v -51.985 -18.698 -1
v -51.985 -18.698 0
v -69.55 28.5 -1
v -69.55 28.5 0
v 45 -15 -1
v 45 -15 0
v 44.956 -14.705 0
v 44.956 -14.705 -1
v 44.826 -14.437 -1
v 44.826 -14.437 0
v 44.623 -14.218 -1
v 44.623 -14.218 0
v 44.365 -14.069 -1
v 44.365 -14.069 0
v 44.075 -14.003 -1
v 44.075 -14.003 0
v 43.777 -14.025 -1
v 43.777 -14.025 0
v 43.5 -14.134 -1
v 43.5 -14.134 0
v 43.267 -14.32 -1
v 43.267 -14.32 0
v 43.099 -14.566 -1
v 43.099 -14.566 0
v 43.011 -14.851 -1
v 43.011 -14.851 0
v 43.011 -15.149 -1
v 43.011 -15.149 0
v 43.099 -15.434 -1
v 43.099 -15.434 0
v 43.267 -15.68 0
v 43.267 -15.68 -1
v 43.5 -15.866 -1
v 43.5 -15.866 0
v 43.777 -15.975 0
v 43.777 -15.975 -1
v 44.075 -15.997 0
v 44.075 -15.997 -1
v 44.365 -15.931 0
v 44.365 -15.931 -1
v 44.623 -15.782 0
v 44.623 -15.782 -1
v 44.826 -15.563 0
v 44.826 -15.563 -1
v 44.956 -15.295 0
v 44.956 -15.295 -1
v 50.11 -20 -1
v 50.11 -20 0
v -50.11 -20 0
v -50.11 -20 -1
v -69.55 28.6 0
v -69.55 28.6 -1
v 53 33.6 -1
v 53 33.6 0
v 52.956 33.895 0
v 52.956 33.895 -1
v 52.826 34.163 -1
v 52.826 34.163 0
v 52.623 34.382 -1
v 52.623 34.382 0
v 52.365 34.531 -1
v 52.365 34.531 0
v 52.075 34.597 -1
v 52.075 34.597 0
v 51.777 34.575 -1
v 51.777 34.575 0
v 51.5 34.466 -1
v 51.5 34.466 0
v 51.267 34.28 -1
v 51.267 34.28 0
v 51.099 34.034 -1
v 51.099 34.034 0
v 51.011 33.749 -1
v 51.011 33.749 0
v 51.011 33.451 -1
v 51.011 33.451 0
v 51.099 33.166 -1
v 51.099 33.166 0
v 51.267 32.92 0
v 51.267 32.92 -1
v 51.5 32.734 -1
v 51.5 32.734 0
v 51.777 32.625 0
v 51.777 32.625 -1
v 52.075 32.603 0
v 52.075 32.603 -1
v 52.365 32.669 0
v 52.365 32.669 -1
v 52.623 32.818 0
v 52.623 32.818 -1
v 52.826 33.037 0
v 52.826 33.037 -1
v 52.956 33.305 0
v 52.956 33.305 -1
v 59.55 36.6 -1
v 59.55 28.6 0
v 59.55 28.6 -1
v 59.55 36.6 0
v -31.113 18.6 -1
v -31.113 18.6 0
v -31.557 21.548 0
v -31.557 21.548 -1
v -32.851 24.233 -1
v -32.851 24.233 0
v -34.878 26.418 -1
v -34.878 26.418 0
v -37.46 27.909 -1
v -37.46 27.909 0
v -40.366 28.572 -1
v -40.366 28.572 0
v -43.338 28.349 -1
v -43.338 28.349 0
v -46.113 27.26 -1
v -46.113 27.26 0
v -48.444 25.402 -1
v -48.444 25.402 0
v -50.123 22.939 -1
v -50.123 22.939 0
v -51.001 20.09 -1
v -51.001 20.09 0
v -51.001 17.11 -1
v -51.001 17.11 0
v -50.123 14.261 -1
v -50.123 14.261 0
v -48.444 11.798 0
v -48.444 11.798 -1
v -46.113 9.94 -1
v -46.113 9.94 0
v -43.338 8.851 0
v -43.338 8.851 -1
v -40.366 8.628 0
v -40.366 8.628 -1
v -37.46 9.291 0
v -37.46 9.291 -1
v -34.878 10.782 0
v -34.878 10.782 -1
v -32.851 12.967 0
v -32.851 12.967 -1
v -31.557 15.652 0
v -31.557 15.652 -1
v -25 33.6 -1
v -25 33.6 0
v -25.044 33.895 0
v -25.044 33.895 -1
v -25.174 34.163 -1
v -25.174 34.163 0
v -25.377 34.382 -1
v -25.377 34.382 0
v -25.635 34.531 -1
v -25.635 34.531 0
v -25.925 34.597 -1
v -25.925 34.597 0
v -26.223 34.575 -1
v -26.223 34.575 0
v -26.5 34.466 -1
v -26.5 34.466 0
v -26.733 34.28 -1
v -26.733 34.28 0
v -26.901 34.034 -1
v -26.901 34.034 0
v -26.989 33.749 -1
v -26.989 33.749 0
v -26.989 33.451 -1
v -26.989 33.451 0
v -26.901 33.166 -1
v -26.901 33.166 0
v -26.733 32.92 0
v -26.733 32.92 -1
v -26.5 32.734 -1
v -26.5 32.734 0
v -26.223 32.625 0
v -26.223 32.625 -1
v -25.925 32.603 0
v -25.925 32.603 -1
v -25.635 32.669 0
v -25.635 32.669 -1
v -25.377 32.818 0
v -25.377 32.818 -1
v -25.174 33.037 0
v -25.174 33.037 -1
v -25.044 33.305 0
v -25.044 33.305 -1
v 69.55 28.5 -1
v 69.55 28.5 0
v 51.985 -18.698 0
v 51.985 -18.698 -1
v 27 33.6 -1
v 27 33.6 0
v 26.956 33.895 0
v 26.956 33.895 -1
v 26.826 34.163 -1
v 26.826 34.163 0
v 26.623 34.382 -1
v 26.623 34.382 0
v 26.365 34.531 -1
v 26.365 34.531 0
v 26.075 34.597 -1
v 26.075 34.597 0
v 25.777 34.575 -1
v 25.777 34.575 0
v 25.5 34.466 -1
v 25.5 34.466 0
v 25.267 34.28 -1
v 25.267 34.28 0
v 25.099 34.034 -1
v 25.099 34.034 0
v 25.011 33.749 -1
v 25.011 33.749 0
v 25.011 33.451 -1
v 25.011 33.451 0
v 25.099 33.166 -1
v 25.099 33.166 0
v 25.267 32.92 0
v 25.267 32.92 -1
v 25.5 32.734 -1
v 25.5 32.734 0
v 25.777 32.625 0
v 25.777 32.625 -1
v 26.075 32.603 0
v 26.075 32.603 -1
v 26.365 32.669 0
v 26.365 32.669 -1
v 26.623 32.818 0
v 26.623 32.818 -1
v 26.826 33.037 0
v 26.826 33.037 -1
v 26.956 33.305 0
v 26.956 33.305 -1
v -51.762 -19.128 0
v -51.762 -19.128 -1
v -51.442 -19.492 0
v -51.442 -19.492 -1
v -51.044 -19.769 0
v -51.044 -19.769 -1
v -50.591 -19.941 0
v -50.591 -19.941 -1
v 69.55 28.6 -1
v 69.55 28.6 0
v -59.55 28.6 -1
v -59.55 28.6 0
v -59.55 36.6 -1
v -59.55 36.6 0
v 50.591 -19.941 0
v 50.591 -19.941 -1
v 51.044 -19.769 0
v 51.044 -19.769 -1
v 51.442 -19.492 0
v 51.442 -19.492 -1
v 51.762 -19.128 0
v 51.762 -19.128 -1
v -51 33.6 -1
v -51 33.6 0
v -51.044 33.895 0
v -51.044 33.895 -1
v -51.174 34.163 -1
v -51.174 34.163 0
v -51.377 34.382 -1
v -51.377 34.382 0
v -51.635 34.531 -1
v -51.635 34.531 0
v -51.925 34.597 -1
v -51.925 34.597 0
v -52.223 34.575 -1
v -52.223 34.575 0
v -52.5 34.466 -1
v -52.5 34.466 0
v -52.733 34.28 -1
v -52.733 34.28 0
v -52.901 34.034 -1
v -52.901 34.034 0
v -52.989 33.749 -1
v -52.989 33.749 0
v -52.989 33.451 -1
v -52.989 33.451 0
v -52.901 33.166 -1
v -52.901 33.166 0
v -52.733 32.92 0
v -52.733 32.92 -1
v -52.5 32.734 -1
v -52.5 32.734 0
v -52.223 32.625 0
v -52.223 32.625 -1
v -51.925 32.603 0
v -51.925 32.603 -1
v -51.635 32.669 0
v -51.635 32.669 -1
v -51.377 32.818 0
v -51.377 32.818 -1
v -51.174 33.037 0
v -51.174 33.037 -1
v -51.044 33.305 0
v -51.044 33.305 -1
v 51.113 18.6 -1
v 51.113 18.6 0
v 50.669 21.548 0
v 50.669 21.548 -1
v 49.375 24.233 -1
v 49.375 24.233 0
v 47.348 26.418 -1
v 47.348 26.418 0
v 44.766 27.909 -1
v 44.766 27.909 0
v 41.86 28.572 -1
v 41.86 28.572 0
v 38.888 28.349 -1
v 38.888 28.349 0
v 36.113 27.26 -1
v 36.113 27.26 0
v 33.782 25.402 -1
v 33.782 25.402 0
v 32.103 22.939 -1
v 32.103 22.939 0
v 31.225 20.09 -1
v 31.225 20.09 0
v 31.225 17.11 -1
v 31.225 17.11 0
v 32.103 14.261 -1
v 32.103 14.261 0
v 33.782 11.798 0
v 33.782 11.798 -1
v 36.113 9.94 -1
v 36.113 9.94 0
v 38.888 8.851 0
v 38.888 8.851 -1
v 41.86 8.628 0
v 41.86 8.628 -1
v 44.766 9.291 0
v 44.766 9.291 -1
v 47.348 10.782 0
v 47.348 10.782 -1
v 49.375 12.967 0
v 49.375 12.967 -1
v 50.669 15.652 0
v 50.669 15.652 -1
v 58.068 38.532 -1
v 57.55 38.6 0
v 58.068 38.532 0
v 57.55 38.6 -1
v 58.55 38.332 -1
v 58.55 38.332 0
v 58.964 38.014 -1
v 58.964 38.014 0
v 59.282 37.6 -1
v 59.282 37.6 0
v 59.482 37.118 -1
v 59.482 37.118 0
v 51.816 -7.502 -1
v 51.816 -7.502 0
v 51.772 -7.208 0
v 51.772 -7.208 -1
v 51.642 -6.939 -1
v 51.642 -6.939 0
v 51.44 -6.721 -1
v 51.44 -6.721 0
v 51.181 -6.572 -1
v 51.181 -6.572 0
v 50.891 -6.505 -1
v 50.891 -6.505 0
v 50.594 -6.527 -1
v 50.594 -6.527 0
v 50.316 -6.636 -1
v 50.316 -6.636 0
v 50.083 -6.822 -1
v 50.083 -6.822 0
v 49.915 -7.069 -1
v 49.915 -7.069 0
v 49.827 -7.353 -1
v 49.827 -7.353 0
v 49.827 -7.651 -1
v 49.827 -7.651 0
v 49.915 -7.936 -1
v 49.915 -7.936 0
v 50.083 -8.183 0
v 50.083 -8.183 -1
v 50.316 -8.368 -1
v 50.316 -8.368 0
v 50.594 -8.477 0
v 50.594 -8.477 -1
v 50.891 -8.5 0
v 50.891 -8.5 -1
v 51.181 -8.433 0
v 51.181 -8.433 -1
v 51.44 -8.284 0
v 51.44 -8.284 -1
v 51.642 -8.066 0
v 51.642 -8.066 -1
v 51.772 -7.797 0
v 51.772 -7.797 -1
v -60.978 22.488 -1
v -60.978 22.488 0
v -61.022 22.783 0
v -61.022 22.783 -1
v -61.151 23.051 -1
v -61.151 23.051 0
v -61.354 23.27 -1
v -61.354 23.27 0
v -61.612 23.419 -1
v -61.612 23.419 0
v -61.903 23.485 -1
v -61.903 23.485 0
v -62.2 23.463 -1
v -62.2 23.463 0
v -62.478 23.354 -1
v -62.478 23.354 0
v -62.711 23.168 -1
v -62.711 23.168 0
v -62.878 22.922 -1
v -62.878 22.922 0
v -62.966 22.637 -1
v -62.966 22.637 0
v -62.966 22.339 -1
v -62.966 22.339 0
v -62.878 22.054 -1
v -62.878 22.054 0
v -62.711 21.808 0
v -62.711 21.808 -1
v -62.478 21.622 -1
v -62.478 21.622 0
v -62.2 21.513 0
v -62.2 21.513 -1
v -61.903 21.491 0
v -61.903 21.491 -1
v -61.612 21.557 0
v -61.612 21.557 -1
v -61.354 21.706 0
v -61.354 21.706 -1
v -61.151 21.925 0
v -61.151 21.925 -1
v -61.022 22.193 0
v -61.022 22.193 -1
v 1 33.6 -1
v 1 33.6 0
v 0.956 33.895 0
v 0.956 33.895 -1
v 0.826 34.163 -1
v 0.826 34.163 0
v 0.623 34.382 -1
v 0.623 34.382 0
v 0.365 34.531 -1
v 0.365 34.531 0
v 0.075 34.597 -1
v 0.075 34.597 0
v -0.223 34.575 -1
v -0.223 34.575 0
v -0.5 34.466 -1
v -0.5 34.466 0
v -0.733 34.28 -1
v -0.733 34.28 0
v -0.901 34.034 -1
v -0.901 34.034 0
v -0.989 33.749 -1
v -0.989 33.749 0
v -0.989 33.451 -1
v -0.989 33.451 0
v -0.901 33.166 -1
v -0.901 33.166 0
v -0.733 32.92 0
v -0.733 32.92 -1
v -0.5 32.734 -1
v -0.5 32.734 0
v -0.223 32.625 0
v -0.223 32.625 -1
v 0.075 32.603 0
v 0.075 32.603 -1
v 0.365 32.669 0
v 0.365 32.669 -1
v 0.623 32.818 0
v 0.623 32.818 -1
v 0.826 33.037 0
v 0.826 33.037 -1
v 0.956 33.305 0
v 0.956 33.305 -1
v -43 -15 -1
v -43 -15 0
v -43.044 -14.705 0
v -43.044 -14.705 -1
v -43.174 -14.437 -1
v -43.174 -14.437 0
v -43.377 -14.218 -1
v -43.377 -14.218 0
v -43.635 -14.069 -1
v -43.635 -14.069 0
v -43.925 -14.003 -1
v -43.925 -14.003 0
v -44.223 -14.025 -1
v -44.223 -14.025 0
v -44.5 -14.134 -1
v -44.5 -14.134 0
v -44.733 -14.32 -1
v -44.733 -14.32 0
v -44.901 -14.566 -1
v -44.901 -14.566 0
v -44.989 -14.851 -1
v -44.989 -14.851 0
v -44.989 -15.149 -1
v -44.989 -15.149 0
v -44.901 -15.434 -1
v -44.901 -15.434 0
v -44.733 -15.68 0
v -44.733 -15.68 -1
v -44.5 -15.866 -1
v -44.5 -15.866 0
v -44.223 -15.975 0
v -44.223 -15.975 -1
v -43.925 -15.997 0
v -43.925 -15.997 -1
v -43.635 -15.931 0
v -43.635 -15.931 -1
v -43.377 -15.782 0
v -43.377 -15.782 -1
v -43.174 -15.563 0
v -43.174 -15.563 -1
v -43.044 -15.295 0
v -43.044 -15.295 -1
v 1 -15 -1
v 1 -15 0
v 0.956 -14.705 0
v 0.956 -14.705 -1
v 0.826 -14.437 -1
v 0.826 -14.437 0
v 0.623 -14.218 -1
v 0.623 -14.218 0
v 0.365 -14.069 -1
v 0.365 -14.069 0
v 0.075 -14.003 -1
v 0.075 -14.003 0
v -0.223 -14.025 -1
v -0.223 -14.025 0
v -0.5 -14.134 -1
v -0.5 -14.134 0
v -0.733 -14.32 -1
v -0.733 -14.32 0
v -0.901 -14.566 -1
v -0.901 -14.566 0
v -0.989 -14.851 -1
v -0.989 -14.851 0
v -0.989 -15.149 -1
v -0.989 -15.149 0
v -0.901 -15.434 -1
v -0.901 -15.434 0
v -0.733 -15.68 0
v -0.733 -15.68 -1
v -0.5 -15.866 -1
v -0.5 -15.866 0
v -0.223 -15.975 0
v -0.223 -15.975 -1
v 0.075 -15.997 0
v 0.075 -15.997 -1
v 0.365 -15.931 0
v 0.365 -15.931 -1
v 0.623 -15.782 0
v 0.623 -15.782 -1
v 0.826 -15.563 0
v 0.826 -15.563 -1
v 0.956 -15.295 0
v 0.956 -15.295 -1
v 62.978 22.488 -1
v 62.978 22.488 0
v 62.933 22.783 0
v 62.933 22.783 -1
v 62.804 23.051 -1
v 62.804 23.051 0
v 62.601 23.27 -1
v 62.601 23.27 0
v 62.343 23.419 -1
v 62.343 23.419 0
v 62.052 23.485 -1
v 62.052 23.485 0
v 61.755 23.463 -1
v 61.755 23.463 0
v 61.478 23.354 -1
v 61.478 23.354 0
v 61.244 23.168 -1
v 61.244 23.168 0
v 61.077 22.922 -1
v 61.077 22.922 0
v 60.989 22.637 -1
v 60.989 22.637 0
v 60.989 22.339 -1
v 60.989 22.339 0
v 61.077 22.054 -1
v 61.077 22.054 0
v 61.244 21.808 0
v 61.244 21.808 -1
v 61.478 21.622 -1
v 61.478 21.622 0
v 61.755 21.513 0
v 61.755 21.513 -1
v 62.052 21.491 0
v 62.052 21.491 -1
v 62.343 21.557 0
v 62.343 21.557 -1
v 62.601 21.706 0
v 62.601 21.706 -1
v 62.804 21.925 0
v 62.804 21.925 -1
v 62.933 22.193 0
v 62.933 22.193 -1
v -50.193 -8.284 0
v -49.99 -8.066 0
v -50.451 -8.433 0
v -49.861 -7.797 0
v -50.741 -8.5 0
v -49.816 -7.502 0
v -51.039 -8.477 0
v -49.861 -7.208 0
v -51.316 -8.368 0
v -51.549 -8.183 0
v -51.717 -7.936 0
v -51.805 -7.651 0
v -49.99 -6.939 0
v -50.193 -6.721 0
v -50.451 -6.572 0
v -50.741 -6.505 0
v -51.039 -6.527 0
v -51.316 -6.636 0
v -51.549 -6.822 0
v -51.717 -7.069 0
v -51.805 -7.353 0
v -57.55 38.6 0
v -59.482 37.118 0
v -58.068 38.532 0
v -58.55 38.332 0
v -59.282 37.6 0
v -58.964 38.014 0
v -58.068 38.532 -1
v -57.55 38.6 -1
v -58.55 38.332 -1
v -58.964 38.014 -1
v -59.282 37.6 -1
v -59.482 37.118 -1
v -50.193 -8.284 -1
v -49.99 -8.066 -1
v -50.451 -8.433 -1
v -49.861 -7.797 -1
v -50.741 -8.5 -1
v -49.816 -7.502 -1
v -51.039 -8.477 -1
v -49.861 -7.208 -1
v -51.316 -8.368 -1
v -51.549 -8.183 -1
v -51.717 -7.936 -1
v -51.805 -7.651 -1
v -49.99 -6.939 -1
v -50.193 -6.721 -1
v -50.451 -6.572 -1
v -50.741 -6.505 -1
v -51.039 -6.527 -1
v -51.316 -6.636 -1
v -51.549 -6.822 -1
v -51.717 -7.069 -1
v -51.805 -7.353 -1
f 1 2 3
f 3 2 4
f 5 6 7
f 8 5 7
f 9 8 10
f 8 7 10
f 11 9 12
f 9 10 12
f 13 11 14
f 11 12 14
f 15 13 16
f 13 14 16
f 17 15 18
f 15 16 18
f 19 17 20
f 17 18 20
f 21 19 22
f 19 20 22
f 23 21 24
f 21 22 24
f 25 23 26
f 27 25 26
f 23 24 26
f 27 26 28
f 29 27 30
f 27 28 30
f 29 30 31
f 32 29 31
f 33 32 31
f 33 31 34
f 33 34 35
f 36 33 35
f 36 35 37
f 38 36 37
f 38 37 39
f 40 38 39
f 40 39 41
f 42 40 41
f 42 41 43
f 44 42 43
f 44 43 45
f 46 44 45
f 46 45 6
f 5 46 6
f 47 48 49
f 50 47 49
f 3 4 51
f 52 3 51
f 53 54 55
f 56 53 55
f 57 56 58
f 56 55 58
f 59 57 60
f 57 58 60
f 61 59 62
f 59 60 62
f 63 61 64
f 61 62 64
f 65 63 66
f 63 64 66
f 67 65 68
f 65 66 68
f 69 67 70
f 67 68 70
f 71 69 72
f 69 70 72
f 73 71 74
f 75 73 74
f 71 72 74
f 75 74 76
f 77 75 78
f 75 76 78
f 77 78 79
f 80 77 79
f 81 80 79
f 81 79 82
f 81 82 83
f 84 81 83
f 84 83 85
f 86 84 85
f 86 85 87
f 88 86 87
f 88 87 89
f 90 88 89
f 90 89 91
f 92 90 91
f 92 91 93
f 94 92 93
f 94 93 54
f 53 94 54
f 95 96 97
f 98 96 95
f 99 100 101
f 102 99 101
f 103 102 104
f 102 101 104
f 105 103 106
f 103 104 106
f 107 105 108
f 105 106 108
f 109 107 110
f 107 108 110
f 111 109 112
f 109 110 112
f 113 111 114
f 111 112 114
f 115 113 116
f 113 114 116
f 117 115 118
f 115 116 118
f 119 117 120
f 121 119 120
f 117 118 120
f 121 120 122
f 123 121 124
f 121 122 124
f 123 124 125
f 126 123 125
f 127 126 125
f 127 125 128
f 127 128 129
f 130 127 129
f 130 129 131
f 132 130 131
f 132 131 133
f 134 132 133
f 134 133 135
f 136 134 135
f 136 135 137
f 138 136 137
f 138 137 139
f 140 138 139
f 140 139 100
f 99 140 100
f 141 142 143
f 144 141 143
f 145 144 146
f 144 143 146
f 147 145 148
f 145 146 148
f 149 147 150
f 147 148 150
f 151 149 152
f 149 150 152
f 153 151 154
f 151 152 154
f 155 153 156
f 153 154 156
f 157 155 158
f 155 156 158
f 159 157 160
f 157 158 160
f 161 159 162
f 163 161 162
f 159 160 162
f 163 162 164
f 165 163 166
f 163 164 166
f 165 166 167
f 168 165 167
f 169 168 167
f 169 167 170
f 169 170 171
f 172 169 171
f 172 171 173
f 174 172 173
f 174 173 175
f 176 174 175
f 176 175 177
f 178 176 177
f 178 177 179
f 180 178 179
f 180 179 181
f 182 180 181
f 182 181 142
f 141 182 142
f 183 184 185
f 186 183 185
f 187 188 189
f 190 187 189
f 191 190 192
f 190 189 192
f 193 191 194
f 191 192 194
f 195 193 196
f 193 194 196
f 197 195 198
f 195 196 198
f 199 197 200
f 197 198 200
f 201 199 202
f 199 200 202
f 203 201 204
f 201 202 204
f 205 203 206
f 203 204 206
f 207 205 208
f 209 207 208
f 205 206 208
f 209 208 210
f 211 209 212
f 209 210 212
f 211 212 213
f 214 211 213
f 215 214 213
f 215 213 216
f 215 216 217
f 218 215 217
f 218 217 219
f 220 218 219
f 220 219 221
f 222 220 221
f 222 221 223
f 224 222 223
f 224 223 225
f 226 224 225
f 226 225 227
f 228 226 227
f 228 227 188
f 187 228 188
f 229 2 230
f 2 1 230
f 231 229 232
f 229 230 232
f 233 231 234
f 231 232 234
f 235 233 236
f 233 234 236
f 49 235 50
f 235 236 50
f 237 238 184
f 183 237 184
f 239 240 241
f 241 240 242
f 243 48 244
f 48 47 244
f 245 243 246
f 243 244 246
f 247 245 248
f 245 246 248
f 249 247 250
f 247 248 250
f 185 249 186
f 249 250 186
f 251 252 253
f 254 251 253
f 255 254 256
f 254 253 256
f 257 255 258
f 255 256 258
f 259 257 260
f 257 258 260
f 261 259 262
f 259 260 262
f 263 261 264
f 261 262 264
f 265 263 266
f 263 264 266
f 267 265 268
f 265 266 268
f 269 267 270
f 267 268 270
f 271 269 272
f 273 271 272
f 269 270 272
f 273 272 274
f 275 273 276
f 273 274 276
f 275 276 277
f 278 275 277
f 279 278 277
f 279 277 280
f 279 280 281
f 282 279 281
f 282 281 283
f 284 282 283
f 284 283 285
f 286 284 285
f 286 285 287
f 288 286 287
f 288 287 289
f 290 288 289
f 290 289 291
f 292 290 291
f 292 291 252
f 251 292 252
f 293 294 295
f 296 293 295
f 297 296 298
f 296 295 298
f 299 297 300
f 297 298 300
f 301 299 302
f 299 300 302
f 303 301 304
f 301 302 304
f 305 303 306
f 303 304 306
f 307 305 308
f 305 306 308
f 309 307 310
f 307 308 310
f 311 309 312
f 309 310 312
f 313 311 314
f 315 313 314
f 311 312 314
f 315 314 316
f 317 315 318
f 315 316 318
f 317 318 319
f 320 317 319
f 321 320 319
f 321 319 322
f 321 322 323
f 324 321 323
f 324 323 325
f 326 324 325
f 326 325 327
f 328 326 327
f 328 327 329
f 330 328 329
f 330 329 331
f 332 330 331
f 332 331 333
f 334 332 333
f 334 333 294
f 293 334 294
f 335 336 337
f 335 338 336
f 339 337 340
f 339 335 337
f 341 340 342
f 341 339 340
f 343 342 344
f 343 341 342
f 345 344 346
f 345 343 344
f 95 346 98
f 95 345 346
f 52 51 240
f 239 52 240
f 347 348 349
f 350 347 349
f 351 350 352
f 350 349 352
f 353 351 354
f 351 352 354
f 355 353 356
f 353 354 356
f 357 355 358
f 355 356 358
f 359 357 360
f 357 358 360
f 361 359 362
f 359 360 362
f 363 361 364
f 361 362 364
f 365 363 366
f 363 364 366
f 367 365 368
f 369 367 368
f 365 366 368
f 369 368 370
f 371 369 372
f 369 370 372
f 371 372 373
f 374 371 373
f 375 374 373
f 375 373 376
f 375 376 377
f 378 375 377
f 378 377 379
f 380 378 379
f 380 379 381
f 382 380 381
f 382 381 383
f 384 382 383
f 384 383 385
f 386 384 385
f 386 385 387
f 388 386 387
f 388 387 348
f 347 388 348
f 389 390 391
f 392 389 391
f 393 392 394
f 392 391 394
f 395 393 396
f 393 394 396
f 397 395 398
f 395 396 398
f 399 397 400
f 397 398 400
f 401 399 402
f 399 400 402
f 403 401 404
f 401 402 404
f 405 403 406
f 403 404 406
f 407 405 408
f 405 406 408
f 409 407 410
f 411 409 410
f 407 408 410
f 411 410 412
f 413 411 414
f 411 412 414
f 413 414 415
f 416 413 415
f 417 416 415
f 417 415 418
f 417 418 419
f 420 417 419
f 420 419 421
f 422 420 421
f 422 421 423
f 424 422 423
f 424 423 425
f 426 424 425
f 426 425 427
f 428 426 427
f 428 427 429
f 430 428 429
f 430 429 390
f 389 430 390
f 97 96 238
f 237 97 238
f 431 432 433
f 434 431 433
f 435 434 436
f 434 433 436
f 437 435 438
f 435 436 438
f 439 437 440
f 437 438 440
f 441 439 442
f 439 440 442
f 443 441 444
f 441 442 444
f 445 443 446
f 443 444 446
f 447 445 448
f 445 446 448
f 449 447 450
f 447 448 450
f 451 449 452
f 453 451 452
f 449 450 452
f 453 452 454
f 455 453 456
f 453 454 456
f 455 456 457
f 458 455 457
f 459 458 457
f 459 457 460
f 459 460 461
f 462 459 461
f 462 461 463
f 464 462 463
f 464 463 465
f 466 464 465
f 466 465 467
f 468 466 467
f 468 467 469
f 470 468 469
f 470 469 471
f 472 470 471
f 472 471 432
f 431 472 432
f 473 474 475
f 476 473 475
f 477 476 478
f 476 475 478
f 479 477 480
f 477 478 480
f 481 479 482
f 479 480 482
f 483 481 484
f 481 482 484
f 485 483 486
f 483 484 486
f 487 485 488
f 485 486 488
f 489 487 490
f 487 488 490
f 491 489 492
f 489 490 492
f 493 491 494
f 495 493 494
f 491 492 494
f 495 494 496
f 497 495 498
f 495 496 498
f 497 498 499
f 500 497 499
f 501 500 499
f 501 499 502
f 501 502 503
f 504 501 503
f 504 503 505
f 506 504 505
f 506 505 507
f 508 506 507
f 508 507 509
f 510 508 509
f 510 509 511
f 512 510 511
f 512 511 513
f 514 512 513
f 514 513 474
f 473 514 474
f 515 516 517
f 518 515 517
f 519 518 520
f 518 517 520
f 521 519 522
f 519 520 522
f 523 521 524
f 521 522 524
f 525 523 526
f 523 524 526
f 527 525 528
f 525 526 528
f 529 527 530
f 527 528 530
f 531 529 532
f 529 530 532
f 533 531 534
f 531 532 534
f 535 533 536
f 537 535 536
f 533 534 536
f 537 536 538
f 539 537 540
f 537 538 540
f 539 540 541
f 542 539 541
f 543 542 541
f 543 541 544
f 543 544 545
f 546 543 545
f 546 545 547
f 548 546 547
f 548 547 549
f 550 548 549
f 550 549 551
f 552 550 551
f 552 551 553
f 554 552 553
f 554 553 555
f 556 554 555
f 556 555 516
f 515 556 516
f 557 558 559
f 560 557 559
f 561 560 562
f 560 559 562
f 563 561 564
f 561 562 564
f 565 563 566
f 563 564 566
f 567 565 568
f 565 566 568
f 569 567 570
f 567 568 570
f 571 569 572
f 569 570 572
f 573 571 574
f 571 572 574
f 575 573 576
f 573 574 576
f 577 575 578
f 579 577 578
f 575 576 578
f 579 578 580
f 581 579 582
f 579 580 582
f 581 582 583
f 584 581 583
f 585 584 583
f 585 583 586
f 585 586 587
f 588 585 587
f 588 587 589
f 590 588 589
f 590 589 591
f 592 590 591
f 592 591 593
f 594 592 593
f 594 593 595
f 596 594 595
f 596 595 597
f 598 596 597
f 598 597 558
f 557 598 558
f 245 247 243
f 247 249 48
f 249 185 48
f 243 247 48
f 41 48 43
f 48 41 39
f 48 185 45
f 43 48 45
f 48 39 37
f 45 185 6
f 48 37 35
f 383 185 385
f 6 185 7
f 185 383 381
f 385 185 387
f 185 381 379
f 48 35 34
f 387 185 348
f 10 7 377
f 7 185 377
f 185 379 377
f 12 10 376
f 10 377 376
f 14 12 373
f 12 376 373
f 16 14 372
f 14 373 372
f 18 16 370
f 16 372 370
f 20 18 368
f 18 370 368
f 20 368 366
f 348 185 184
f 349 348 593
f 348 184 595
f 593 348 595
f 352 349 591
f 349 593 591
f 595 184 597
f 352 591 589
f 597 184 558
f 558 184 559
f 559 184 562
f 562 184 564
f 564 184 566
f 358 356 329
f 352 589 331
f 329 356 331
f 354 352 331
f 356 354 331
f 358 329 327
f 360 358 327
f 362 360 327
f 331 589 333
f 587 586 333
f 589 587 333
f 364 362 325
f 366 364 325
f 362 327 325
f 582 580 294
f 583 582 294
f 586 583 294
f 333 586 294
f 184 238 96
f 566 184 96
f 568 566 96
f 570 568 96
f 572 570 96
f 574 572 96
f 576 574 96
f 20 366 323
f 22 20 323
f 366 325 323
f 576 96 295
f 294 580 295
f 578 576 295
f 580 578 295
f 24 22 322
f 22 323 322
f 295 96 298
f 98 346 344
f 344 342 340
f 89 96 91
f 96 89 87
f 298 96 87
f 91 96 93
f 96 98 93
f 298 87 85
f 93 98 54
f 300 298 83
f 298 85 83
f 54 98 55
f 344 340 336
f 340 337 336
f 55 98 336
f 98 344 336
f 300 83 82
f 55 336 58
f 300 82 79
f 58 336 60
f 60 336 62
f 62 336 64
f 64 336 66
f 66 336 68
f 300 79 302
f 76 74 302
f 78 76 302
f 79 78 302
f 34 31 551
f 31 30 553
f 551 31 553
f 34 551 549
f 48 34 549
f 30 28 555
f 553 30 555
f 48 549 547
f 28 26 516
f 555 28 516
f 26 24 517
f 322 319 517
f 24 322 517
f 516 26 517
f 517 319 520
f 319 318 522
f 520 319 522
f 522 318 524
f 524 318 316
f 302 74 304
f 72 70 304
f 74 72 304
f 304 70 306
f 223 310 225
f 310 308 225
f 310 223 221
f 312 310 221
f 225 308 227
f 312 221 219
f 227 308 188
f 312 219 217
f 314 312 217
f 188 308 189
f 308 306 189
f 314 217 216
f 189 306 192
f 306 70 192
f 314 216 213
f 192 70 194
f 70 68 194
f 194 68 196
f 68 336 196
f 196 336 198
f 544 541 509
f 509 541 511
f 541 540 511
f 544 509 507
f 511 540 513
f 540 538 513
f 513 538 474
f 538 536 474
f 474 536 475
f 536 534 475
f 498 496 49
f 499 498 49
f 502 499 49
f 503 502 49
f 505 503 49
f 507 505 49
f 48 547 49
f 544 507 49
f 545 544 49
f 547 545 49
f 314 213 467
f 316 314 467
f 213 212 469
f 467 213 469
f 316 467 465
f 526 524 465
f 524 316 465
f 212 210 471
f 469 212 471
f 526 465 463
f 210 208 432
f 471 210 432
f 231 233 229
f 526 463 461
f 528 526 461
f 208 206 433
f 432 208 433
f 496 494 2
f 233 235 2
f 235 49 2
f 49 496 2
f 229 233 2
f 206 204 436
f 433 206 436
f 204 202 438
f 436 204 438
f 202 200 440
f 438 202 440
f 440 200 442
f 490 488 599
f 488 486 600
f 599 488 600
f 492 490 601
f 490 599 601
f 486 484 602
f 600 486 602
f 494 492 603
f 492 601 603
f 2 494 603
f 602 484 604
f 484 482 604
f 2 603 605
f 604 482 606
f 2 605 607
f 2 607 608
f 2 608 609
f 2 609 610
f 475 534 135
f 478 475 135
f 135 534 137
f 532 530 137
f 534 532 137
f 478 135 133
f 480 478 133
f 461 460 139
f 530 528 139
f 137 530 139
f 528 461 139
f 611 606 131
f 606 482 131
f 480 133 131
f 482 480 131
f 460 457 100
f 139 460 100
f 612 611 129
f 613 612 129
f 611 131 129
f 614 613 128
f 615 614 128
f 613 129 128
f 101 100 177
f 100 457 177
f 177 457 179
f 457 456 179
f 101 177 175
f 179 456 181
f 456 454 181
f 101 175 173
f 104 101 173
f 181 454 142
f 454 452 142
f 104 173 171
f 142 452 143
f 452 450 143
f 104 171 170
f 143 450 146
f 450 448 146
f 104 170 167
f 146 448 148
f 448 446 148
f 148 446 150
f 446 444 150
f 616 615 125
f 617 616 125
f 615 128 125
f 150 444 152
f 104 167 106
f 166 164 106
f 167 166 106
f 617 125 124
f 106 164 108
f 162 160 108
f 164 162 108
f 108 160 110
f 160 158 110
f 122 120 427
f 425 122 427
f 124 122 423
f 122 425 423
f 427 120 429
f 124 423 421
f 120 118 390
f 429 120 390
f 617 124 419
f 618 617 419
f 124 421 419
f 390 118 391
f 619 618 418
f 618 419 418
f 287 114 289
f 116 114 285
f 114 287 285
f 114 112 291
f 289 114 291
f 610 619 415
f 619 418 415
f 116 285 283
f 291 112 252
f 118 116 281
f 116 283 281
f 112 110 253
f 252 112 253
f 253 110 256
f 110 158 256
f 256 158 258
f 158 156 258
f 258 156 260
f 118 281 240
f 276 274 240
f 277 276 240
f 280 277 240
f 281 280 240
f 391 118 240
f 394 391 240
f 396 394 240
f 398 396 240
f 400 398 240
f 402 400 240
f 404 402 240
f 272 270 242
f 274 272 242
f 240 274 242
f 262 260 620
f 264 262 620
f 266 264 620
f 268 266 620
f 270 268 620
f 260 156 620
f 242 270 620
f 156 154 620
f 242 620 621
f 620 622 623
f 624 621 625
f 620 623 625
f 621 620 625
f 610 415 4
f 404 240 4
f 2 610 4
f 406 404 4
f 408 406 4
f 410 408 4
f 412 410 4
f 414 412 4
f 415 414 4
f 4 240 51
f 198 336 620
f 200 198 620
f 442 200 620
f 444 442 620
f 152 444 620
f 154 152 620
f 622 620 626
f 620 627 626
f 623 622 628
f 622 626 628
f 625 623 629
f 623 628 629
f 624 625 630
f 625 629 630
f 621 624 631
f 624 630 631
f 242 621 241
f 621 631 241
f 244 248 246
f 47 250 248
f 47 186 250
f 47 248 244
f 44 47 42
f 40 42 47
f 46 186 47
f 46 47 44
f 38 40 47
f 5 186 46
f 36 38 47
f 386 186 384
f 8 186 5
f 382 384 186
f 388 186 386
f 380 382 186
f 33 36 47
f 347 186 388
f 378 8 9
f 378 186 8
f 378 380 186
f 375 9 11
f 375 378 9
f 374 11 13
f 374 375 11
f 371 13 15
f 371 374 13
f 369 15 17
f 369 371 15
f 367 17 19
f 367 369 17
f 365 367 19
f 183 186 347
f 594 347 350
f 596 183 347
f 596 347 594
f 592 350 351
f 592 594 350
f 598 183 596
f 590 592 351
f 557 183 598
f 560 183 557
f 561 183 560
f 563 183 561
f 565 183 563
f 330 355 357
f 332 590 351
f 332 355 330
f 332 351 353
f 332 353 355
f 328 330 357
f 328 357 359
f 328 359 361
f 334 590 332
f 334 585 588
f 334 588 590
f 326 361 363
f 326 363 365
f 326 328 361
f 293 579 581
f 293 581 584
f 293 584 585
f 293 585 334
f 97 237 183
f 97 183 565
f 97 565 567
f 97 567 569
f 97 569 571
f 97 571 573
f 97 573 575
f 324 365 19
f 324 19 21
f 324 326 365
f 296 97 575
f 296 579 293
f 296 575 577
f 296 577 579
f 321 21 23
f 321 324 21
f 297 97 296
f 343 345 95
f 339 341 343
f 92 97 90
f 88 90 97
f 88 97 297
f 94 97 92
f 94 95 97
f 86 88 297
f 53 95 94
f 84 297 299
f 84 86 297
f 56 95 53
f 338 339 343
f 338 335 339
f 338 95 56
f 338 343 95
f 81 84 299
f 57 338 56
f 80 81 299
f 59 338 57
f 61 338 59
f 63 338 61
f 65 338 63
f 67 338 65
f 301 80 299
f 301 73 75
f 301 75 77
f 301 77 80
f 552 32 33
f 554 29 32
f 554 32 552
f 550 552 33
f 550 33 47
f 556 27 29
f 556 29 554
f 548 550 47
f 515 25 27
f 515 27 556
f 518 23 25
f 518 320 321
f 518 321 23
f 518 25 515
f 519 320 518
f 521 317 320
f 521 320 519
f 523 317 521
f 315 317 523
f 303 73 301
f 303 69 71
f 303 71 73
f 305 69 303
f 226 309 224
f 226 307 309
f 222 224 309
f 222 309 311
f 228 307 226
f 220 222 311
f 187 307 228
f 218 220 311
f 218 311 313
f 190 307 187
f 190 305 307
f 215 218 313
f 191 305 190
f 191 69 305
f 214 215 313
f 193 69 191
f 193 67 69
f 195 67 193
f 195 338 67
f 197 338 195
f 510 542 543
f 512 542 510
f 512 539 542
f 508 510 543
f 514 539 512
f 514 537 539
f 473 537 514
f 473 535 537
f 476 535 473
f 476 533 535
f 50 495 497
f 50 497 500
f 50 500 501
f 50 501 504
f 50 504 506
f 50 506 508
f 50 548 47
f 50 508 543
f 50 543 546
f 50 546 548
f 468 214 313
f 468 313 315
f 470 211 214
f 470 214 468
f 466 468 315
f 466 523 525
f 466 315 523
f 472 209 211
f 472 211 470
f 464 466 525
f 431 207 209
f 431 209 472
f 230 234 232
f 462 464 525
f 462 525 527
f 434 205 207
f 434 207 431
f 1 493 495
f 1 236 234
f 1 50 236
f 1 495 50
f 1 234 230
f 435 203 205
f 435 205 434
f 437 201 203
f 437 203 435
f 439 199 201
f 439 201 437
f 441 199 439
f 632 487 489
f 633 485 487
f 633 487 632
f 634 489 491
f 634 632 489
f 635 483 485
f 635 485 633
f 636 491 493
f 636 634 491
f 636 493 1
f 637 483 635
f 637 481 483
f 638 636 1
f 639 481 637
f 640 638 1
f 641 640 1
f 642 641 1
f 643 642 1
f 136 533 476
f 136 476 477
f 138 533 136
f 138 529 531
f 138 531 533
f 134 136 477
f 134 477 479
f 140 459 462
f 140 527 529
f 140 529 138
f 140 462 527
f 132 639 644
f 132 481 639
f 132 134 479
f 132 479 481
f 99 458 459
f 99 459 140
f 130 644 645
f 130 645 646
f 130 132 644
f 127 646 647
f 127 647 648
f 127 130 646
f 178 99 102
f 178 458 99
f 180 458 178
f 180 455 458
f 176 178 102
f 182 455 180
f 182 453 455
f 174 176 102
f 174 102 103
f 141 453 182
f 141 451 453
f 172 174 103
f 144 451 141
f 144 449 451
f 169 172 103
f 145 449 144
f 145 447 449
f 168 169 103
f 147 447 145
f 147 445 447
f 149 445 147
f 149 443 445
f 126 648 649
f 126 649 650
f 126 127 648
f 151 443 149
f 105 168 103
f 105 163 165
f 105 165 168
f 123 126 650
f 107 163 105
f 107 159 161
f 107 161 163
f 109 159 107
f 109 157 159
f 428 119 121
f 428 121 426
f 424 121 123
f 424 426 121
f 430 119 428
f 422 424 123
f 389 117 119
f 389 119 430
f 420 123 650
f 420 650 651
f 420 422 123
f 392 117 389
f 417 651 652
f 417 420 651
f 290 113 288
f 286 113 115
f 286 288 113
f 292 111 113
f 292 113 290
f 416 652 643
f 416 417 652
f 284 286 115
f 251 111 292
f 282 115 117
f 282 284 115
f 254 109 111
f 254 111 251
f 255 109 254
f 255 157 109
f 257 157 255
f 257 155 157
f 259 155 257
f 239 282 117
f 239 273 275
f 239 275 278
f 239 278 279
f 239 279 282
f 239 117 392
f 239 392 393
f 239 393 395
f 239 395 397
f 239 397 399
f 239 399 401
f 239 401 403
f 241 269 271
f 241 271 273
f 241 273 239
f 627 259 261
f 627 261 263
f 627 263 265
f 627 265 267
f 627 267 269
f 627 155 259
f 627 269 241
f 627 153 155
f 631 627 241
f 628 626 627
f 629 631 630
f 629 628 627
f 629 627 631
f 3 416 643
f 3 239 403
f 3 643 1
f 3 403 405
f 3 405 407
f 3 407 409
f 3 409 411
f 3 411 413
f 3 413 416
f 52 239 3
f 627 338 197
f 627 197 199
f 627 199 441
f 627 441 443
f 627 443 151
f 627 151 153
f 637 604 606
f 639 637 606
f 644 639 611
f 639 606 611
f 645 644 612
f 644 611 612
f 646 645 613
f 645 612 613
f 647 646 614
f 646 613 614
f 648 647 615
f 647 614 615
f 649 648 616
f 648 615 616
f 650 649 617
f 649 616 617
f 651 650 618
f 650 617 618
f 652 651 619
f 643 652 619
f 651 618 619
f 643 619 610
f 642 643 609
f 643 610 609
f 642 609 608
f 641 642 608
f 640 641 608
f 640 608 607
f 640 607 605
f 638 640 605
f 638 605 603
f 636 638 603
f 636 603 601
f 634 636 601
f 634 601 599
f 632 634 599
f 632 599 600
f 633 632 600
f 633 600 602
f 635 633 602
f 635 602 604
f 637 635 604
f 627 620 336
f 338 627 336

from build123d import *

# Parameters (mm, degrees)
SM_BASE_FLANGE_1_DEPTH = 1
SKETCH_3_R             = 1
SKETCH_3_R_2           = 10
SKETCH_3_W             = 10
SKETCH_3_H             = 10
CUT_EXTRUDE_1_DEPTH    = 2
FILLET_1_R             = 2


# Sheet-metal steps are written as plain solids
with BuildPart() as part:
    # Sketch 1 → 基材-凸緣1 (new body)
    with BuildSketch(Plane.XY):
        Polygon((-69.55, 38.6), (69.55, 38.6), (69.55, 28.5), (51.5, -20), (-51.5, -20), (-69.55, 28.5), align=None)
    extrude(amount=-SM_BASE_FLANGE_1_DEPTH)

    # 草圖3 → 除料-伸長1 (cut)
    with BuildSketch(Plane.XY):
        with Locations((0, -15)):
            Circle(SKETCH_3_R)
        with Locations((44, -15)):
            Circle(SKETCH_3_R)
        with Locations((-44, -15)):
            Circle(SKETCH_3_R)
        with Locations((-50.81612653, -7.502401461)):
            Circle(SKETCH_3_R)
        with Locations((-61.977500026, 22.487992696)):
            Circle(SKETCH_3_R)
        with Locations((0, 33.6)):
            Circle(SKETCH_3_R)
        with Locations((-26, 33.6)):
            Circle(SKETCH_3_R)
        with Locations((-52, 33.6)):
            Circle(SKETCH_3_R)
        with Locations((26, 33.6)):
            Circle(SKETCH_3_R)
        with Locations((52, 33.6)):
            Circle(SKETCH_3_R)
        with Locations((61.977500026, 22.487992696)):
            Circle(SKETCH_3_R)
        with Locations((50.81612653, -7.502401461)):
            Circle(SKETCH_3_R)
        with Locations((-41.112999651, 18.6)):
            Circle(SKETCH_3_R_2)
        with Locations((41.112999651, 18.6)):
            Circle(SKETCH_3_R_2)
        with Locations((-64.55, 33.6)):
            Rectangle(SKETCH_3_W, SKETCH_3_H)
        with Locations((64.55, 33.6)):
            Rectangle(SKETCH_3_W, SKETCH_3_H)
    extrude(amount=-CUT_EXTRUDE_1_DEPTH, mode=Mode.SUBTRACT)

    # 圓角1
    fillet_1_edges = [part.edges().sort_by_distance(p)[0] for p in [
        (51.5, -20, -0.5),
        (-51.5, -20, -0.5),
        (59.55, 38.6, -0.5),
        (-59.55, 38.6, -0.5),
    ]]
    fillet(fillet_1_edges, radius=FILLET_1_R)


solid = part.part
